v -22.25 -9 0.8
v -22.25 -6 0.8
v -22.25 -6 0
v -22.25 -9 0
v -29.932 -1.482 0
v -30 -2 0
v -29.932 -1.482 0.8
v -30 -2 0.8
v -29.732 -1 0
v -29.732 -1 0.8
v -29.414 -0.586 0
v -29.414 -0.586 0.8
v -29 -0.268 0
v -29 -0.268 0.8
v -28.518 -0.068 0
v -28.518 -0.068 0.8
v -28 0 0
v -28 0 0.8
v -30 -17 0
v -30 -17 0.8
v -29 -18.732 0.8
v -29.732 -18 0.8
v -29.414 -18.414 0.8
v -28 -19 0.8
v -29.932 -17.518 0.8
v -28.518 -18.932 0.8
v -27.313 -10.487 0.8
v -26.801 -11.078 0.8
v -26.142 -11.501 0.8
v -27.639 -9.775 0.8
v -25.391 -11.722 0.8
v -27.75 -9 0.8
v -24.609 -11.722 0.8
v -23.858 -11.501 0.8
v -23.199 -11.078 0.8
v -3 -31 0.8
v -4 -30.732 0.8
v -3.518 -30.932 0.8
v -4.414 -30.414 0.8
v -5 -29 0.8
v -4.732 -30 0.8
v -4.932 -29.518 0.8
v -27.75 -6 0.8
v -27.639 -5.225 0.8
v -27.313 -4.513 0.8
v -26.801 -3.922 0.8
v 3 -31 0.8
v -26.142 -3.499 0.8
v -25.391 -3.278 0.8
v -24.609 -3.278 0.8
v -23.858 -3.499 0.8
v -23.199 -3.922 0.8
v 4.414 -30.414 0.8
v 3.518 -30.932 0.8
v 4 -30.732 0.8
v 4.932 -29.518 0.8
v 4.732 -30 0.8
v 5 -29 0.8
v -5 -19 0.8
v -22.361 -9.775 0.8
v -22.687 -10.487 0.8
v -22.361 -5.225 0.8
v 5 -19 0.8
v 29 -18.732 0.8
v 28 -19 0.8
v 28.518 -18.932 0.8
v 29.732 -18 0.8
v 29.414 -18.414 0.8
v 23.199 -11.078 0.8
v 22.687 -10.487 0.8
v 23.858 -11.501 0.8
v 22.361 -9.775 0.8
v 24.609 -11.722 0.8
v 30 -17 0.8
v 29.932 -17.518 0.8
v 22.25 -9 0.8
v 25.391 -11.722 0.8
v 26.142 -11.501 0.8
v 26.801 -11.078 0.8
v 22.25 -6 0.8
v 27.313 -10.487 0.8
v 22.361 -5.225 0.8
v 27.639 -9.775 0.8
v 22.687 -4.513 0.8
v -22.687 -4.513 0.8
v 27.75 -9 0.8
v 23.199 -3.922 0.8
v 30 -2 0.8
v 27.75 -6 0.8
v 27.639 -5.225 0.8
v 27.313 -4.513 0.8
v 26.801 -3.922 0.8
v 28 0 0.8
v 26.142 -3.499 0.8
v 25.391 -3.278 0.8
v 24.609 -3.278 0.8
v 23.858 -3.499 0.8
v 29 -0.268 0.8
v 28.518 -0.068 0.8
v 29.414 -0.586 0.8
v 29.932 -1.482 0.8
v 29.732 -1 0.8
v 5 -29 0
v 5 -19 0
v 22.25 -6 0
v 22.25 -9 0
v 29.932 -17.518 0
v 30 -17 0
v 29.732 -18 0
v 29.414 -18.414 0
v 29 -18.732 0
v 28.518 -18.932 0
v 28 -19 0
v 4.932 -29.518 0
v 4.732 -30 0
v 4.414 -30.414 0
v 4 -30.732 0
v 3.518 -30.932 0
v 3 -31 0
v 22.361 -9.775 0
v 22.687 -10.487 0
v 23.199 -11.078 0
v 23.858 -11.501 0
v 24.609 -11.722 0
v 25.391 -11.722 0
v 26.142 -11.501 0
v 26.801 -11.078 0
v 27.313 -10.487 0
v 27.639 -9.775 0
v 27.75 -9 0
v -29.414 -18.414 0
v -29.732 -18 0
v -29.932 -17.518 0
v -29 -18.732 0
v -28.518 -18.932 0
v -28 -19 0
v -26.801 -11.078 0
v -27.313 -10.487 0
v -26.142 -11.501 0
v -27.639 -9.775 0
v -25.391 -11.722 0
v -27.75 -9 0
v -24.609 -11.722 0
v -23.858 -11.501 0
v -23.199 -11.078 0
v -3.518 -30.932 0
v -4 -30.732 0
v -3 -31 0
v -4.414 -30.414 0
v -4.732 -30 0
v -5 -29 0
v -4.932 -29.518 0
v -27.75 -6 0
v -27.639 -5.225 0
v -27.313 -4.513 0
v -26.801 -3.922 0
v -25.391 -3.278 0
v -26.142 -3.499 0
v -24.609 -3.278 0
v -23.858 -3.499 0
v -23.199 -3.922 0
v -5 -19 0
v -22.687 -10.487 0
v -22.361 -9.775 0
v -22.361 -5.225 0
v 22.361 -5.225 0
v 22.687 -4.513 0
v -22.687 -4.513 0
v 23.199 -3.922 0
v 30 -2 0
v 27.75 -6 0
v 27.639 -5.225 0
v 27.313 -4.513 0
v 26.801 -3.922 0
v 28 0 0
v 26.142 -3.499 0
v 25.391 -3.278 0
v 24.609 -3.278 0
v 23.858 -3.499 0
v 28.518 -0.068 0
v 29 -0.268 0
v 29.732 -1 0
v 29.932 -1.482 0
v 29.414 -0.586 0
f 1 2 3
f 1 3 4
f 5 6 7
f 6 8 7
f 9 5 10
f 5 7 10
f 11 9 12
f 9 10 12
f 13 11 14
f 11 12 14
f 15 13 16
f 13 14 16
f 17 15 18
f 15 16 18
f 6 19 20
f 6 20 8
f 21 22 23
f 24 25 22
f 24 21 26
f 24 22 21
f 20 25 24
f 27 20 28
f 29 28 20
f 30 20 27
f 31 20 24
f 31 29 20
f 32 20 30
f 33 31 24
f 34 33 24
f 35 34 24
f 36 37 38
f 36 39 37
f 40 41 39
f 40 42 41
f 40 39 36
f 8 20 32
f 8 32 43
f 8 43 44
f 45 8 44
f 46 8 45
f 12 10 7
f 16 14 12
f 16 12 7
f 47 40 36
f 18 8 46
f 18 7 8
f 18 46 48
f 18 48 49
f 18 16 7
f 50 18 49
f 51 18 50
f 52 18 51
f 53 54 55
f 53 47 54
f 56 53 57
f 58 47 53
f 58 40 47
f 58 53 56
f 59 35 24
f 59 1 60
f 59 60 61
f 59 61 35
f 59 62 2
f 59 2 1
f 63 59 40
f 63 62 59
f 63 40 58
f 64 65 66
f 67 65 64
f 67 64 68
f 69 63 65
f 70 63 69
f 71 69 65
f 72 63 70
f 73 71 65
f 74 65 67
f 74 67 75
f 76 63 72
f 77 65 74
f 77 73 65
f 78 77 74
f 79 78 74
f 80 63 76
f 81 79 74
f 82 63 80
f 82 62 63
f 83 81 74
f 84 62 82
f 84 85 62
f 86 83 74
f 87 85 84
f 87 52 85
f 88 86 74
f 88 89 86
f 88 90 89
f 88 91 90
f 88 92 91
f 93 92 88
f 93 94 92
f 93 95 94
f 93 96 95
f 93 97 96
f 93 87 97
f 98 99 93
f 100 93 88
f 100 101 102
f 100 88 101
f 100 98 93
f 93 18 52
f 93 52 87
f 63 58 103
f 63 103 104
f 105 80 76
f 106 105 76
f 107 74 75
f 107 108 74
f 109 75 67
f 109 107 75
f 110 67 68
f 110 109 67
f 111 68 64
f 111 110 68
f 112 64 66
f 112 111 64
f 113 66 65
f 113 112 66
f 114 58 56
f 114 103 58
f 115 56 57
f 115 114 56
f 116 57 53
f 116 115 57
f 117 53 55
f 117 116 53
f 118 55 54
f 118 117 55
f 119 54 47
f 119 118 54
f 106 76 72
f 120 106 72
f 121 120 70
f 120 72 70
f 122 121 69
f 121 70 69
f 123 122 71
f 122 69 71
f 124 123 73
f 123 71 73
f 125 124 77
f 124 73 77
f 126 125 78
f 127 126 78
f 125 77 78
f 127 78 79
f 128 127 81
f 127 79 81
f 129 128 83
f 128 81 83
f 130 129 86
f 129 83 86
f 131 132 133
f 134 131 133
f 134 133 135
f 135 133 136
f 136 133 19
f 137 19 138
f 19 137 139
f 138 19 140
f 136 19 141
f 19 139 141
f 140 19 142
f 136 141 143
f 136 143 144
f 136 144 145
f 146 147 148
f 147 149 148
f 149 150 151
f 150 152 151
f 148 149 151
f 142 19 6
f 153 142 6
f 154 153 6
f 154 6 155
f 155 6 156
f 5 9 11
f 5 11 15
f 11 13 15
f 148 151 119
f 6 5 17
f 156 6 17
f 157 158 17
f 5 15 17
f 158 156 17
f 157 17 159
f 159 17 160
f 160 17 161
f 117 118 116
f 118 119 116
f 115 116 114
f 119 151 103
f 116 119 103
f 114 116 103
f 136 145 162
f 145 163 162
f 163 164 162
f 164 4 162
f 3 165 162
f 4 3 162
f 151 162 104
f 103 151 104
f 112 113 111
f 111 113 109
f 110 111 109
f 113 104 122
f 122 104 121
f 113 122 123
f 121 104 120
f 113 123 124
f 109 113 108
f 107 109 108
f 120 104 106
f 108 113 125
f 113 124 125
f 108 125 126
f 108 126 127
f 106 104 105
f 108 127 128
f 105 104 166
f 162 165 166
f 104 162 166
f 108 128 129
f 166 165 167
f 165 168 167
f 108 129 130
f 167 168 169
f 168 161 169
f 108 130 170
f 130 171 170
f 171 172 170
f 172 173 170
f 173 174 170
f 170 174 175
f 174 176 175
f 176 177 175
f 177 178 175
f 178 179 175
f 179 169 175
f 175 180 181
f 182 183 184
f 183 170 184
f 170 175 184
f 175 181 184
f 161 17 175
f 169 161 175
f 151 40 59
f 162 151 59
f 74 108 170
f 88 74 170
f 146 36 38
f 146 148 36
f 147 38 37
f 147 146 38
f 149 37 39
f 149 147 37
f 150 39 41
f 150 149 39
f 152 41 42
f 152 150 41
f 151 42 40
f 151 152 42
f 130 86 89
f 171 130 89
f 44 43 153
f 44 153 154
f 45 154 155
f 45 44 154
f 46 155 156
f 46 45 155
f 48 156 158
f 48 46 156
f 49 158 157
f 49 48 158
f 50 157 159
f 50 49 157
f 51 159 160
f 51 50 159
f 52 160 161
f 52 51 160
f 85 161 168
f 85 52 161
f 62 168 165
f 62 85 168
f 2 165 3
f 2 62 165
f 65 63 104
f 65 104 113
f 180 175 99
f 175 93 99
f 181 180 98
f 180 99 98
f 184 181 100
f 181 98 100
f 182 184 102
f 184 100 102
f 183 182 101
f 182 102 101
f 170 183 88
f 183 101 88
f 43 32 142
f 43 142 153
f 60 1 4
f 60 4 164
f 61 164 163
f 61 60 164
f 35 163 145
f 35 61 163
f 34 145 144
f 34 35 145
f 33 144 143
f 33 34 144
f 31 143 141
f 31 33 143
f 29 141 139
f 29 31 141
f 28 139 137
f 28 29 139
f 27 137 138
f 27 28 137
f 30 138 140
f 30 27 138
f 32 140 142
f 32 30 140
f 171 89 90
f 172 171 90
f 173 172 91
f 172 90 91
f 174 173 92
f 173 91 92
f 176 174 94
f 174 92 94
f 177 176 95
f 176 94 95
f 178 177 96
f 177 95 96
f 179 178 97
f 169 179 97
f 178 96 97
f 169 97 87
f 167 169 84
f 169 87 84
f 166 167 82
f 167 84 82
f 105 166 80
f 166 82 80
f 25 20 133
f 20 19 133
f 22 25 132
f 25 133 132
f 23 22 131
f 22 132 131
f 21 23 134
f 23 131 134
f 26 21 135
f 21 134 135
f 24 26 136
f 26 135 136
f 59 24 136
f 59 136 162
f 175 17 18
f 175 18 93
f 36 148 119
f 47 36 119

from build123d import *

# Parameters (mm, degrees)
SKETCH_1_W             = 60
SKETCH_1_H             = 31
SM_BASE_FLANGE_1_DEPTH = 0.8
CUT_EXTRUDE_2_DEPTH    = 44.146726411
SKETCH_14_W            = 25
SKETCH_14_H            = 12
CUT_EXTRUDE_3_DEPTH    = 44.146726411
FILLET_3_R             = 2


# Sheet-metal steps are written as plain solids
with BuildPart() as part:
    # Sketch 1 → 基体-法兰1 (new body)
    with BuildSketch(Plane.XY):
        with Locations((0, -15.5)):
            Rectangle(SKETCH_1_W, SKETCH_1_H)
    extrude(amount=SM_BASE_FLANGE_1_DEPTH)

    # 草图13 → 切除-拉伸2 (cut, through all)
    with BuildSketch(Plane.XY.offset(0.8)):
        with BuildLine():
            Line((-27.75, -9), (-27.75, -6))
            ThreePointArc((-27.75, -6), (-25, -3.25), (-22.25, -6))
            Line((-22.25, -6), (-22.25, -9))
            ThreePointArc((-22.25, -9), (-25, -11.75), (-27.75, -9))
        make_face()
        with BuildLine():
            Line((27.75, -9), (27.75, -6))
            ThreePointArc((27.75, -6), (25, -3.25), (22.25, -6))
            Line((22.25, -6), (22.25, -9))
            ThreePointArc((22.25, -9), (25, -11.75), (27.75, -9))
        make_face()
    extrude(amount=-CUT_EXTRUDE_2_DEPTH, mode=Mode.SUBTRACT)

    # 草图14 → 切除-拉伸3 (cut, through all)
    with BuildSketch(Plane.XY.offset(0.8)):
        with Locations((-17.5, -25)):
            Rectangle(SKETCH_14_W, SKETCH_14_H)
        with Locations((17.5, -25)):
            Rectangle(SKETCH_14_W, SKETCH_14_H)
    extrude(amount=-CUT_EXTRUDE_3_DEPTH, mode=Mode.SUBTRACT)

    # 圆角3
    fillet_3_edges = [part.edges().sort_by_distance(p)[0] for p in [
        (-5, -31, 0.4),
        (-30, -19, 0.4),
        (5, -31, 0.4),
        (30, -19, 0.4),
        (-30, 0, 0.4),
        (30, 0, 0.4),
    ]]
    fillet(fillet_3_edges, radius=FILLET_3_R)


solid = part.part
